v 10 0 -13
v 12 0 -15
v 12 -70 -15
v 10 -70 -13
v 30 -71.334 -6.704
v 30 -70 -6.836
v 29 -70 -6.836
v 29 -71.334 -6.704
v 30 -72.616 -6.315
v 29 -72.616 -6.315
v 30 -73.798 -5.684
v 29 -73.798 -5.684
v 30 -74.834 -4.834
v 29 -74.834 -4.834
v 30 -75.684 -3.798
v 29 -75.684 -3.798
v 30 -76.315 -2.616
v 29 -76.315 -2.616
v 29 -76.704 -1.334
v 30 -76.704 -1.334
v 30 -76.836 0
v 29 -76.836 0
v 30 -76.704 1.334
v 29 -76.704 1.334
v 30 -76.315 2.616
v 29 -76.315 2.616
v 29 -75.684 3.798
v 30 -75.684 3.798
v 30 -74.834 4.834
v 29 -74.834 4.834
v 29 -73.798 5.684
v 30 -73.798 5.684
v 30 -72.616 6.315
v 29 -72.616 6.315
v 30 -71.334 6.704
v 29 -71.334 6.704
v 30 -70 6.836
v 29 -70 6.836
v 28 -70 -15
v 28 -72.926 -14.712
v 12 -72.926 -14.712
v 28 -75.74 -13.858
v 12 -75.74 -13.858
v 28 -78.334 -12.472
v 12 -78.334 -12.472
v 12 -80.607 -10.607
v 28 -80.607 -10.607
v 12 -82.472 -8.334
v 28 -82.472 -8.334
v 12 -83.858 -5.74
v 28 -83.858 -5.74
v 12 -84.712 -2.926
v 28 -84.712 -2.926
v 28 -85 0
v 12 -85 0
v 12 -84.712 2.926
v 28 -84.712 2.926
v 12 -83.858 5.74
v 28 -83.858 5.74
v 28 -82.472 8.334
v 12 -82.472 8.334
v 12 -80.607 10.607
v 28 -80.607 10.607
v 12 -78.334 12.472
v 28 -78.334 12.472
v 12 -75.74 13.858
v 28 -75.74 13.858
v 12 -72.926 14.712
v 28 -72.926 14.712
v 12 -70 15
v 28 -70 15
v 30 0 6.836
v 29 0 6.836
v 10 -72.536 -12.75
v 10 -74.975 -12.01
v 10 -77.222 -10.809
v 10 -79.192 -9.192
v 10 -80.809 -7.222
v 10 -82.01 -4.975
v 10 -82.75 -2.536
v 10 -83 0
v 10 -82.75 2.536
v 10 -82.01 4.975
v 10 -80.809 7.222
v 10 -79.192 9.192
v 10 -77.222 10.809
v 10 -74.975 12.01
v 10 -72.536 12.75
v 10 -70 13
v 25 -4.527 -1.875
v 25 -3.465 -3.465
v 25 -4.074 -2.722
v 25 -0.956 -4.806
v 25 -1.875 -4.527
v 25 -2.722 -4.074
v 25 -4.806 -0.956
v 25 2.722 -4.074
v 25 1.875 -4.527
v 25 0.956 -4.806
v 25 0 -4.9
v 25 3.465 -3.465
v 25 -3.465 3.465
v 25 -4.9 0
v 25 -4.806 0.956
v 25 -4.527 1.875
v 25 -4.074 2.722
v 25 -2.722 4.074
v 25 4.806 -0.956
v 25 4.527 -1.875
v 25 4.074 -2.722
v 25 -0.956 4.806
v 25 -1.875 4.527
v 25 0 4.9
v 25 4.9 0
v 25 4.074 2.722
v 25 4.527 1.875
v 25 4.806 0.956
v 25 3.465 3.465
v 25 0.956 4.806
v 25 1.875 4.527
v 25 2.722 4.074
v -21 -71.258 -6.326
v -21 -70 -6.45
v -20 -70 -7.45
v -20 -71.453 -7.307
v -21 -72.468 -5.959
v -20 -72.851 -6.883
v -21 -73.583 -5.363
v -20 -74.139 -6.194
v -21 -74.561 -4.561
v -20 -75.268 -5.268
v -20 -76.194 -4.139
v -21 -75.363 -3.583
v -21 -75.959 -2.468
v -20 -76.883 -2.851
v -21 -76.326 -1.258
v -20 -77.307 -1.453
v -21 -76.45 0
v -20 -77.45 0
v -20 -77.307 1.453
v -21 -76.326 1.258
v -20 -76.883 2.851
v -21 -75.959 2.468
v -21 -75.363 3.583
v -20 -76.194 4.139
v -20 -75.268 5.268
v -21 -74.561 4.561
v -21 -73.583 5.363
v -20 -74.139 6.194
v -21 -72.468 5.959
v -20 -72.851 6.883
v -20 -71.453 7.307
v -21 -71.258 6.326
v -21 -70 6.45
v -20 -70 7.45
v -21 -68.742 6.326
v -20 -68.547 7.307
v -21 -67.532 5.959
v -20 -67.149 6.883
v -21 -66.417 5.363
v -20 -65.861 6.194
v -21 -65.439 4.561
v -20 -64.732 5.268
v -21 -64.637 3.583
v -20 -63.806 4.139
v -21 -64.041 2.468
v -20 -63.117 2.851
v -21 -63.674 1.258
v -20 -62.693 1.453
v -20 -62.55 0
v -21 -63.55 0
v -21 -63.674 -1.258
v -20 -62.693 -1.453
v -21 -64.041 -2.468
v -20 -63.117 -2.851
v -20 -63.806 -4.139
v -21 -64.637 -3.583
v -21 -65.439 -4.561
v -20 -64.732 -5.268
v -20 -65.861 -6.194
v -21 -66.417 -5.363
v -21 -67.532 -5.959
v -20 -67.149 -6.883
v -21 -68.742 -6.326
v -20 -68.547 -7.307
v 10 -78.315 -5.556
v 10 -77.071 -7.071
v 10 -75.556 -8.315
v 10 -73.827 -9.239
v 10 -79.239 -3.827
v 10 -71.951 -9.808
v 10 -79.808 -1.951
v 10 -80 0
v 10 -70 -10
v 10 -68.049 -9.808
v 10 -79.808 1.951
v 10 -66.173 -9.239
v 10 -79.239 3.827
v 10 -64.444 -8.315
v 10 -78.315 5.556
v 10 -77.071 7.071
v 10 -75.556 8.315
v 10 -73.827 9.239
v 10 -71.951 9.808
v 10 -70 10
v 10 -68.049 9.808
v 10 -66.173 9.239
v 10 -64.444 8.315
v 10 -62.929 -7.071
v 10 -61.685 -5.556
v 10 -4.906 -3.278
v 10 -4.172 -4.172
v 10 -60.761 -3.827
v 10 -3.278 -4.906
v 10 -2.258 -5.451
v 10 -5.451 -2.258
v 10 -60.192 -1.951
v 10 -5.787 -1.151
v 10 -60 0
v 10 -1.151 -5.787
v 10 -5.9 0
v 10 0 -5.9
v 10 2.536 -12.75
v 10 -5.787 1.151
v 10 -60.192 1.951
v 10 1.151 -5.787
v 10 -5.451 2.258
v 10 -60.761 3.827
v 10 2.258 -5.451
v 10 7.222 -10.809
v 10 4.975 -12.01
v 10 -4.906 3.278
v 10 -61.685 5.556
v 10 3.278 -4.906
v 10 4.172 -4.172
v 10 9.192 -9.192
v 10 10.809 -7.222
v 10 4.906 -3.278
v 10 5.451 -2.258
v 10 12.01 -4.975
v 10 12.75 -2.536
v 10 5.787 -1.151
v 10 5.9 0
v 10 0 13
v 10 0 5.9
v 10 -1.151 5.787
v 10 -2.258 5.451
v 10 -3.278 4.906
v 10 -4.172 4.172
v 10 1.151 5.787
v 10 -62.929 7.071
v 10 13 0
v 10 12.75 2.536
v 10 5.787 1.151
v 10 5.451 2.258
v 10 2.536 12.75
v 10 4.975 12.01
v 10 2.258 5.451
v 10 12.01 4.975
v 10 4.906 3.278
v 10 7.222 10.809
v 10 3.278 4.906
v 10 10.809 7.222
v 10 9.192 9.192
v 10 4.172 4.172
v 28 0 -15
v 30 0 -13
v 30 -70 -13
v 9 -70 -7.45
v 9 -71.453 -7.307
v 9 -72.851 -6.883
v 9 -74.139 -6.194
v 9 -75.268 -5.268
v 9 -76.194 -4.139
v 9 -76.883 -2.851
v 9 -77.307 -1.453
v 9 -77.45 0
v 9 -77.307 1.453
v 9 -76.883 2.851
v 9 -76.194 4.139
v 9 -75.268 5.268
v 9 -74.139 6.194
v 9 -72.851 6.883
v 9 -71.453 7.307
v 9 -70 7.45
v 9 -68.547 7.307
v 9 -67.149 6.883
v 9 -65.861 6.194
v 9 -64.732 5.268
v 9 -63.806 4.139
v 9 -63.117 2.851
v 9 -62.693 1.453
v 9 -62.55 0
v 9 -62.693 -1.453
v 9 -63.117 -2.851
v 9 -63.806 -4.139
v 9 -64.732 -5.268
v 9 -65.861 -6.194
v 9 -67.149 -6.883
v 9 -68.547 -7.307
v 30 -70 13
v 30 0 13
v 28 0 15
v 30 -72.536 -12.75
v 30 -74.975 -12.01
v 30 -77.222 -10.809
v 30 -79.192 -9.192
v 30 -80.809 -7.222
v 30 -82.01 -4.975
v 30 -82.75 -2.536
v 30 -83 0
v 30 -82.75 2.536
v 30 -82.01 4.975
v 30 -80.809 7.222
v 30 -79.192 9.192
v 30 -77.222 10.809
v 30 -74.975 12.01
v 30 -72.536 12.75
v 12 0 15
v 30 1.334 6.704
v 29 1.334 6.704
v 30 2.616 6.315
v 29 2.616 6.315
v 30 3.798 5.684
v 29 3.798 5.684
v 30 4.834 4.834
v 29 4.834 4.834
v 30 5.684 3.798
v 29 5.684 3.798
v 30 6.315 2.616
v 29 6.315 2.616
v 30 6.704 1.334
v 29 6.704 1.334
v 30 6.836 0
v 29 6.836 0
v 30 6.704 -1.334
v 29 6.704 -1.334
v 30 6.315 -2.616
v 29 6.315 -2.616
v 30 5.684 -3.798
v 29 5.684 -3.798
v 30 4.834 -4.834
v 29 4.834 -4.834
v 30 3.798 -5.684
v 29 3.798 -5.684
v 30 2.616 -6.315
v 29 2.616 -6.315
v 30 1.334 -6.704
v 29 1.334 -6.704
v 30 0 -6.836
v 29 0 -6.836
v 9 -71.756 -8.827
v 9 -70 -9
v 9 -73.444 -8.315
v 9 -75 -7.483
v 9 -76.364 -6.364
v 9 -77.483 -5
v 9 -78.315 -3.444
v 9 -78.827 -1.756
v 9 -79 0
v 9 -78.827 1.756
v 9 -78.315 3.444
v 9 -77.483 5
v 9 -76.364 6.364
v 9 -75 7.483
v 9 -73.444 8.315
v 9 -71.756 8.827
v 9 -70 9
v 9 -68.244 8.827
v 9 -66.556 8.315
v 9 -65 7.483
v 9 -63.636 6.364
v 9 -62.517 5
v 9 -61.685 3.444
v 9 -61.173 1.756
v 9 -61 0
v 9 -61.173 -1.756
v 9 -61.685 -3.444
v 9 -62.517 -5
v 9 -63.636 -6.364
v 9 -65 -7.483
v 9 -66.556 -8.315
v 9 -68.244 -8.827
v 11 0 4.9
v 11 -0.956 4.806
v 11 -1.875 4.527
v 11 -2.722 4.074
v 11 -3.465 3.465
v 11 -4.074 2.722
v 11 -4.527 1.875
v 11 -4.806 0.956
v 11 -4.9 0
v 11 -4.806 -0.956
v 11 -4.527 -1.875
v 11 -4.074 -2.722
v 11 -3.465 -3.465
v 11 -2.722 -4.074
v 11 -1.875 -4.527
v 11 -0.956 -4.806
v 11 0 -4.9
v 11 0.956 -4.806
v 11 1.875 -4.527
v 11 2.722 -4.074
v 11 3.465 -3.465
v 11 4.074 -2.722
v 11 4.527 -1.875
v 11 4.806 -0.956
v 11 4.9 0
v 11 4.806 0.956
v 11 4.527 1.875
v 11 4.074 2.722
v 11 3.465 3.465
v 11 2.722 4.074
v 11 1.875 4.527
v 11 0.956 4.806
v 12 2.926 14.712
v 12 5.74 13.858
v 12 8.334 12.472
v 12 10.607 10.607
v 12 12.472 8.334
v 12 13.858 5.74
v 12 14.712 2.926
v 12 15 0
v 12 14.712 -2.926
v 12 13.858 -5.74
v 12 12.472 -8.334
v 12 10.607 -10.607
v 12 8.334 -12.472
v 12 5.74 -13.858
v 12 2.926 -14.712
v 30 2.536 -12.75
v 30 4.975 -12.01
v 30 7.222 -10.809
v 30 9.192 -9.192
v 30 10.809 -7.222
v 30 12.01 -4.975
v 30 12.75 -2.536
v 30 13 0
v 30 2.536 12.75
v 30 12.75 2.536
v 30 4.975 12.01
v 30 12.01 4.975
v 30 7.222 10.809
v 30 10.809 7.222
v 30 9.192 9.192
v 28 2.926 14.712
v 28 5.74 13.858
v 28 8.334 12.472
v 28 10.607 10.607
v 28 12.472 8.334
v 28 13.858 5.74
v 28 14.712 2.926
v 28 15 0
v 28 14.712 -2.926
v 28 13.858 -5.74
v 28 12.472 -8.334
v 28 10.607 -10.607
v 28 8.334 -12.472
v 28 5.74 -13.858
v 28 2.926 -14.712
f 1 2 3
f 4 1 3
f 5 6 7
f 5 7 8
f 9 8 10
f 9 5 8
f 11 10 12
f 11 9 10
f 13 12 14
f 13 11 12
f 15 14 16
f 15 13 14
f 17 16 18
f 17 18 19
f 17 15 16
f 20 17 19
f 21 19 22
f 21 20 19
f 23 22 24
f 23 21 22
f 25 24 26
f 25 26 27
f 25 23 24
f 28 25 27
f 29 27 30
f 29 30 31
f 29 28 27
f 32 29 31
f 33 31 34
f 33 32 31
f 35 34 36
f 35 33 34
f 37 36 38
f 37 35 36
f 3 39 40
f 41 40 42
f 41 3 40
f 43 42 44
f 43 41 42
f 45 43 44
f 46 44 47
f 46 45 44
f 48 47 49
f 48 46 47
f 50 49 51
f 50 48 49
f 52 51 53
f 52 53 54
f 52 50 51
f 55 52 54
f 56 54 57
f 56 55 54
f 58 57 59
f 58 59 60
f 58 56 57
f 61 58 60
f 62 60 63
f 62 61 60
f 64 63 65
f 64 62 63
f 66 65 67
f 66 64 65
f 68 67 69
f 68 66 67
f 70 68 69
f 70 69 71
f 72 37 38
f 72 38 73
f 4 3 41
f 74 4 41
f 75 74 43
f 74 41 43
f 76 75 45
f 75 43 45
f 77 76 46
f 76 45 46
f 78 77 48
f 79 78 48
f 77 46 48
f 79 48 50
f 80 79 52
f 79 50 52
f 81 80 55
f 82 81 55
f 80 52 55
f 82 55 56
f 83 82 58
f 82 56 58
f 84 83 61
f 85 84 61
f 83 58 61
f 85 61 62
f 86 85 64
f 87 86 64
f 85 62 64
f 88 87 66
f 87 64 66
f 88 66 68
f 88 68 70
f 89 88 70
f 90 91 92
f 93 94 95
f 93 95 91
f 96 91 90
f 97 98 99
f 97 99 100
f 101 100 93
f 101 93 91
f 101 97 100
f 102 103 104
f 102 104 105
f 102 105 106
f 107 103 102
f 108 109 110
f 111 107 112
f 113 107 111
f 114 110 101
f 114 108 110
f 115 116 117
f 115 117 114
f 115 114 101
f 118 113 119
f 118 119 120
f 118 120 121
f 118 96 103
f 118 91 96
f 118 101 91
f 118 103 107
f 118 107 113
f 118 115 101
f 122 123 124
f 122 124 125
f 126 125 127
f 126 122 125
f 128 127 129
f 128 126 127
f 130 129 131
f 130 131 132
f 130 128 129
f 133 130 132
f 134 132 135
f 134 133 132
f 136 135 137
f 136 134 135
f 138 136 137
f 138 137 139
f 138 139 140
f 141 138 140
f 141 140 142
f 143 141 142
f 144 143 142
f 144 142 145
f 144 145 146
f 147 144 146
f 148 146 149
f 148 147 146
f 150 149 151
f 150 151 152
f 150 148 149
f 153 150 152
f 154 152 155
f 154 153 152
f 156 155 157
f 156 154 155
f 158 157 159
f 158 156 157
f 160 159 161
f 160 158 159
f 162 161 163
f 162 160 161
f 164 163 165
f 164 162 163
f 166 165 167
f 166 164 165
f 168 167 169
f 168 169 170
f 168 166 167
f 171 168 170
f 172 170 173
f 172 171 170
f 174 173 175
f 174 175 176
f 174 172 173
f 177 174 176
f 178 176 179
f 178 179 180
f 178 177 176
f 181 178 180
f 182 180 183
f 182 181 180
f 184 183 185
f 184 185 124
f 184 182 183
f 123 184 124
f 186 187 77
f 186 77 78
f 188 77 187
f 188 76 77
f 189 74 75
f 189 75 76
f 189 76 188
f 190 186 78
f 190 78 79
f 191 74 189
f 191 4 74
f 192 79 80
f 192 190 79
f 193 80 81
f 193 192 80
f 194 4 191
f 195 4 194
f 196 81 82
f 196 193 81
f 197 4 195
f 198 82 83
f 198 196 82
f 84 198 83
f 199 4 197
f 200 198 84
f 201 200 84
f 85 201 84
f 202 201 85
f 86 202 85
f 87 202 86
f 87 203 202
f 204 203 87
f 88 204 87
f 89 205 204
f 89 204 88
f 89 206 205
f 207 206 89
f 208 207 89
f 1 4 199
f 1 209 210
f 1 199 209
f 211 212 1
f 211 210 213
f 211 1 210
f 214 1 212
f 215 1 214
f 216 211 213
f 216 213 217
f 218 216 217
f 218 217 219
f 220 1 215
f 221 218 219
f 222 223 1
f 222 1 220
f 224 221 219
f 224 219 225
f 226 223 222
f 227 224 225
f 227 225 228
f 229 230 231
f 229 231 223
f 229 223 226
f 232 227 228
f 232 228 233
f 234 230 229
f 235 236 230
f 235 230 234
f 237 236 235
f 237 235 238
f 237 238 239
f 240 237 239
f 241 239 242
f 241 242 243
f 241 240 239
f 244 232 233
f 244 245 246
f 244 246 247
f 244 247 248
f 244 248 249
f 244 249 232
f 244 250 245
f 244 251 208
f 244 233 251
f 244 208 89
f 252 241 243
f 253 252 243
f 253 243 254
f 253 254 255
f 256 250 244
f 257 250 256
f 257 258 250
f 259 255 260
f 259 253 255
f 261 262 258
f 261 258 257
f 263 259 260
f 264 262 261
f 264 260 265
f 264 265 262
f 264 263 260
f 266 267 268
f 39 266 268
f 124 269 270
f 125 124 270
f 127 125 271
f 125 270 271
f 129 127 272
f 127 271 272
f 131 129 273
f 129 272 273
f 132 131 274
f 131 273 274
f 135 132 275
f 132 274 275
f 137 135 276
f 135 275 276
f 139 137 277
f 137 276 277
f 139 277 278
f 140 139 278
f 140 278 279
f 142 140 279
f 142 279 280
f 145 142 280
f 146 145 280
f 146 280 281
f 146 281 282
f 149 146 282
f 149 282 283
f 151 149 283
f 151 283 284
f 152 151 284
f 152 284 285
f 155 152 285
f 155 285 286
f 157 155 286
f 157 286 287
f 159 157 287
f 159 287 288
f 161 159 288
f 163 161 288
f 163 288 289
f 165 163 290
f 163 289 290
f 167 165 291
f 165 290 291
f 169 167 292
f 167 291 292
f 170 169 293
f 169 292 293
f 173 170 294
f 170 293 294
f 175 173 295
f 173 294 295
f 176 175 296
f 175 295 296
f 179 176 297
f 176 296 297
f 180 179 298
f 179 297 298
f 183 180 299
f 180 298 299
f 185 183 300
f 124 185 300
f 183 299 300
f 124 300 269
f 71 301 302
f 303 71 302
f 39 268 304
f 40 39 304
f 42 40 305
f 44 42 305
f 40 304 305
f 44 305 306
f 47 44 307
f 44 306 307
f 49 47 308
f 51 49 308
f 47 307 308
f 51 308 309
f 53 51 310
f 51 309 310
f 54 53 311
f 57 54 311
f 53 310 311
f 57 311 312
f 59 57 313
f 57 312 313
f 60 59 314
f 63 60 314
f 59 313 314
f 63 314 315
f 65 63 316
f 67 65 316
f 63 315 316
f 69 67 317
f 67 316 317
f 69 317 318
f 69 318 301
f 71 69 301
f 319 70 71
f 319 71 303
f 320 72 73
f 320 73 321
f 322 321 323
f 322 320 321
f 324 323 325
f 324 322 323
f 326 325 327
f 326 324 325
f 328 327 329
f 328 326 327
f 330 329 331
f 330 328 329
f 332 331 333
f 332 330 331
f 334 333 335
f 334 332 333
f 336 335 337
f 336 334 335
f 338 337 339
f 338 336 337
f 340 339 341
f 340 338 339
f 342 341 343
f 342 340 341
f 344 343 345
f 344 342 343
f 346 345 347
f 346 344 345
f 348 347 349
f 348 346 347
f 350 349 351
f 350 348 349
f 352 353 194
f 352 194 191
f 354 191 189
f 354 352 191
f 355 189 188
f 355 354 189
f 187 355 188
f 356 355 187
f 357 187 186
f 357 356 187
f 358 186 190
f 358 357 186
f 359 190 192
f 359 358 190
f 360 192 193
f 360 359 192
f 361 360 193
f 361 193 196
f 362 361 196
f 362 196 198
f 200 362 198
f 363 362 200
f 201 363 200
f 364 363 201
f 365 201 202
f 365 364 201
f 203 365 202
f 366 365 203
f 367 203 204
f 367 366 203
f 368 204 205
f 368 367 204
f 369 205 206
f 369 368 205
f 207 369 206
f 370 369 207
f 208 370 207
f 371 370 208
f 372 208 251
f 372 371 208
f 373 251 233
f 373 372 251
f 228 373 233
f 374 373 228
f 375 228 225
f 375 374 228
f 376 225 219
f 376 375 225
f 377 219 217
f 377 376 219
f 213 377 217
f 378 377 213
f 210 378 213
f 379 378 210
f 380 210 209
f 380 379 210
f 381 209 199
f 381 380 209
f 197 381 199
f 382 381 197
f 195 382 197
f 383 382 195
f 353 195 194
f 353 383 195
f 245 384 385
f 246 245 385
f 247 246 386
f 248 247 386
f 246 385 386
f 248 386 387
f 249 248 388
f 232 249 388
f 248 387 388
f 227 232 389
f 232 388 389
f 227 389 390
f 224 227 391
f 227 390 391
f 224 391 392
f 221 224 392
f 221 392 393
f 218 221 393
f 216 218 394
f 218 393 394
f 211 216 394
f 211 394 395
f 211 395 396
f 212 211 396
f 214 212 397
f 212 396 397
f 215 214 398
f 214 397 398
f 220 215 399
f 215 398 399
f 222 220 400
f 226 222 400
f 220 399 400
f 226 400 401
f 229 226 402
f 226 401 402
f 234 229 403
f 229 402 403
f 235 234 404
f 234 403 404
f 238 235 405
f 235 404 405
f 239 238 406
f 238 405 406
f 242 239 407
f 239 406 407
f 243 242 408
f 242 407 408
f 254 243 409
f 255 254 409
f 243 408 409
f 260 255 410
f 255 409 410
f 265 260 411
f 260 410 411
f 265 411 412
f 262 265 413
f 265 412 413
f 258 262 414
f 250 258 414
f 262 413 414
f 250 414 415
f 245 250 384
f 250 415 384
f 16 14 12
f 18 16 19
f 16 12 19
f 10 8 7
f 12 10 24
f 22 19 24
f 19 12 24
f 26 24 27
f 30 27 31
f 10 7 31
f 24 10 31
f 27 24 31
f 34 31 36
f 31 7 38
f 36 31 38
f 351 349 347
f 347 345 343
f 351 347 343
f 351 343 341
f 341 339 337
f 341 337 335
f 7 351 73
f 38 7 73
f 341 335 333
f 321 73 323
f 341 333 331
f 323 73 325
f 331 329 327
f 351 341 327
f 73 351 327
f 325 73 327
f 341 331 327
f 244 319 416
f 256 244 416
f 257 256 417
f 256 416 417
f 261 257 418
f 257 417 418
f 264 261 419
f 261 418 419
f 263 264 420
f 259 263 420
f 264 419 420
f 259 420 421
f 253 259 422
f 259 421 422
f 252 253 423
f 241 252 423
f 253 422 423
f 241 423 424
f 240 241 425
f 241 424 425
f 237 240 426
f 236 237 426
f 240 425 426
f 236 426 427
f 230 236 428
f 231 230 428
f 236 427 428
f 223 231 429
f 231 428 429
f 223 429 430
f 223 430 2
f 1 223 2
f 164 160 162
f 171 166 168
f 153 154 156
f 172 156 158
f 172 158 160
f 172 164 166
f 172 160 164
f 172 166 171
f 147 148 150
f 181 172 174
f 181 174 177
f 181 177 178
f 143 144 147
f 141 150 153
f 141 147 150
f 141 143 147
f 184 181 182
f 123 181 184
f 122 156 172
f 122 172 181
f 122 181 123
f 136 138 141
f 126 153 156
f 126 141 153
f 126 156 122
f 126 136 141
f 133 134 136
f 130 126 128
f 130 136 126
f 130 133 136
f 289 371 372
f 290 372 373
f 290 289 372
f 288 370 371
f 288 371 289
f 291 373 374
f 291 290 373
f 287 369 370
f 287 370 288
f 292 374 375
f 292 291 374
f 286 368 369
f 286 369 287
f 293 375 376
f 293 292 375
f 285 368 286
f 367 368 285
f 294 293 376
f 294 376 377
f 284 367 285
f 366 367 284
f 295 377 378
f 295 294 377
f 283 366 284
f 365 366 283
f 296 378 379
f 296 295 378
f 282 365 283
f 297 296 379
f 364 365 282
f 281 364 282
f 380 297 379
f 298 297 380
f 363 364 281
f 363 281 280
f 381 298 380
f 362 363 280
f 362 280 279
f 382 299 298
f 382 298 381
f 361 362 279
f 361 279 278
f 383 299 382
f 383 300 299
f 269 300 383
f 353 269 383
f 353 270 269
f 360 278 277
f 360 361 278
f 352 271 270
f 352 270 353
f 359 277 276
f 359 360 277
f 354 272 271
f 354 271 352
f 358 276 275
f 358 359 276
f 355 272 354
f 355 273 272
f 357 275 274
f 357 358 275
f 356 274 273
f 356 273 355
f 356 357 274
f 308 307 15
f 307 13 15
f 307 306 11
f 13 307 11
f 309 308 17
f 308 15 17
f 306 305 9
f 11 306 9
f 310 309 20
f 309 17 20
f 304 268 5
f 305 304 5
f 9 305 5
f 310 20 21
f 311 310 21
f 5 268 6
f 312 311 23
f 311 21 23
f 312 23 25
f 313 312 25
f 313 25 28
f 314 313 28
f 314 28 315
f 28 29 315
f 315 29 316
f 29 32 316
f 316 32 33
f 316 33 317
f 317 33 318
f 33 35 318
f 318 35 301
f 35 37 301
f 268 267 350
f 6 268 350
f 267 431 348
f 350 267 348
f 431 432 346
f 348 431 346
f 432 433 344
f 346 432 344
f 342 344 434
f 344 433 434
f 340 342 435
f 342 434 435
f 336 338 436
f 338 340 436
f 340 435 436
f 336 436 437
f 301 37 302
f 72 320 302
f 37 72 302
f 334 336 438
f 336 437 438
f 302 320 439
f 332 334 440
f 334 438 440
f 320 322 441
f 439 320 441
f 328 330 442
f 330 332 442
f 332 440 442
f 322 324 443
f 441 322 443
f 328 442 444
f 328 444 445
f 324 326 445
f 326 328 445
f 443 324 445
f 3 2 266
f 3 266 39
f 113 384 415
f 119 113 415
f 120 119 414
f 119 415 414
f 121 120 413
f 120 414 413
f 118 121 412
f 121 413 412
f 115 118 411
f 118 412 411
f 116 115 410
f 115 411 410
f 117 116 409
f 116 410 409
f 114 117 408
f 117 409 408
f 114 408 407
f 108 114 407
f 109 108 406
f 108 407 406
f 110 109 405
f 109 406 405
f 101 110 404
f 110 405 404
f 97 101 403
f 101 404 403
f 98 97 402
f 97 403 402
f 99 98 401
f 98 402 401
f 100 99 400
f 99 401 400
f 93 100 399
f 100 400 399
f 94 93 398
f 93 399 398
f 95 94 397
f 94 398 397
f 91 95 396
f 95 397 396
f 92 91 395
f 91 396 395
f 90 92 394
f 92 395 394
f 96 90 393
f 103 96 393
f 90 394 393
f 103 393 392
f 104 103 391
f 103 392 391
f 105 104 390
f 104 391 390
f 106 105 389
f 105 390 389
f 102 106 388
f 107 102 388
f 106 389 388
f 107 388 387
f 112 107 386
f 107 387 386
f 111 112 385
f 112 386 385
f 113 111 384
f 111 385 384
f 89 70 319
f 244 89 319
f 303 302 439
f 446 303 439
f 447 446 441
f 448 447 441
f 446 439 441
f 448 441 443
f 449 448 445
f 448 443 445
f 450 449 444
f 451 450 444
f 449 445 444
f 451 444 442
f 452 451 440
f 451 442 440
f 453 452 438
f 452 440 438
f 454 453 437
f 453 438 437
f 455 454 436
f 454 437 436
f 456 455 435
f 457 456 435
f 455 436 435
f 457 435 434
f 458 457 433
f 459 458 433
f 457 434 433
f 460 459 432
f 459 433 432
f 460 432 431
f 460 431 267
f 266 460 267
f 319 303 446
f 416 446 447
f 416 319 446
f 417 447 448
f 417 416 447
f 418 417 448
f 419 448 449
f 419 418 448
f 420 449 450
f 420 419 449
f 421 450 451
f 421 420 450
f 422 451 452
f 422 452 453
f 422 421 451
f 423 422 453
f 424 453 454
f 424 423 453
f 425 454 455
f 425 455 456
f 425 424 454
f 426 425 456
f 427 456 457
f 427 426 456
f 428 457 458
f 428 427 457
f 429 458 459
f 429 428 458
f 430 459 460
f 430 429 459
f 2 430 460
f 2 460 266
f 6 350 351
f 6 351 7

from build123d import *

# Parameters (mm, degrees)
SKETCH_1_R          = 4.9
EXTRUDE_1_DEPTH     = 10
EXTRUDE_2_DEPTH     = 20
SKETCH_3_R          = 7.45
EXTRUDE_3_DEPTH     = 31
CHAMFER_1_SIZE      = 2
CUT_EXTRUDE_1_DEPTH = 1
SKETCH_5_R          = 4.9
CUT_EXTRUDE_2_DEPTH = 25
SKETCH_9_R          = 10
EXTRUDE_4_DEPTH     = 1
CHAMFER_2_SIZE      = 1
CHAMFER_4_SIZE      = 1
CHAMFER_5_SIZE      = 1


with BuildPart() as part:
    # 草图1 → 凸台-拉伸1 (new body)
    with BuildSketch(Plane(origin=(0, 0, 0), x_dir=(0, 0, -1), z_dir=(1, 0, 0))):
        Circle(SKETCH_1_R)
    extrude(amount=EXTRUDE_1_DEPTH)

    # 草图2 → 凸台-拉伸2 (add)
    with BuildSketch(Plane(origin=(10, 0, 0), x_dir=(0, 0, -1), z_dir=(1, 0, 0))):
        with BuildLine():
            Line((15, 0), (15, -70))
            ThreePointArc((15, -70), (0, -85), (-15, -70))
            Line((-15, -70), (-15, 0))
            ThreePointArc((-15, 0), (0, 15), (15, 0))
        make_face()
    extrude(amount=EXTRUDE_2_DEPTH)

    # 草图3 → 凸台-拉伸3 (add)
    with BuildSketch(Plane.ZY.offset(-10)):
        with Locations(Location((0, -70, 0), (0, 0, 180))):
            Circle(SKETCH_3_R)
    extrude(amount=EXTRUDE_3_DEPTH)

    # 倒角1
    chamfer_1_edges = [part.edges().sort_by_distance(p)[0] for p in [
        (10, -35, 15),
        (10, -85, 0),
        (30, -35, -15),
        (10, 15, 0),
        (30, -35, 15),
        (30, -85, 0),
        (30, 15, 0),
        (10, -35, -15),
    ]]
    chamfer(chamfer_1_edges, length=CHAMFER_1_SIZE)

    # 草图4 → 切除-拉伸1 (cut)
    with BuildSketch(Plane(origin=(30, 0, 0), x_dir=(0, 0, -1), z_dir=(1, 0, 0))):
        with BuildLine():
            Line((6.835634275, 0), (6.835634275, -70))
            ThreePointArc((6.835634275, -70), (0, -76.835634275), (-6.835634275, -70))
            Line((-6.835634275, -70), (-6.835634275, 0))
            ThreePointArc((-6.835634275, 0), (0, 6.835634275), (6.835634275, 0))
        make_face()
    extrude(amount=-CUT_EXTRUDE_1_DEPTH, mode=Mode.SUBTRACT)

    # 草图5 → 切除-拉伸2 (cut)
    with BuildSketch(Plane.ZY):
        Circle(SKETCH_5_R)
    extrude(amount=-CUT_EXTRUDE_2_DEPTH, mode=Mode.SUBTRACT)

    # 草图9 → 凸台-拉伸4 (add)
    with BuildSketch(Plane.ZY.offset(-10)):
        with Locations(Location((0, -70, 0), (0, 0, 180))):
            Circle(SKETCH_9_R)
    extrude(amount=EXTRUDE_4_DEPTH)

    # 倒角2
    chamfer_2_edges = [part.edges().sort_by_distance(p)[0] for p in [
        (9, -70, 10),
    ]]
    chamfer(chamfer_2_edges, length=CHAMFER_2_SIZE - 0.0001)  # a hair under: the kernel refuses the full size

    # 倒角4
    chamfer_4_edges = [part.edges().sort_by_distance(p)[0] for p in [
        (10, 0, -4.9),
    ]]
    chamfer(chamfer_4_edges, length=CHAMFER_4_SIZE)

    # 倒角5
    chamfer_5_edges = [part.edges().sort_by_distance(p)[0] for p in [
        (-21, -70, 7.45),
    ]]
    chamfer(chamfer_5_edges, length=CHAMFER_5_SIZE)


solid = part.part
